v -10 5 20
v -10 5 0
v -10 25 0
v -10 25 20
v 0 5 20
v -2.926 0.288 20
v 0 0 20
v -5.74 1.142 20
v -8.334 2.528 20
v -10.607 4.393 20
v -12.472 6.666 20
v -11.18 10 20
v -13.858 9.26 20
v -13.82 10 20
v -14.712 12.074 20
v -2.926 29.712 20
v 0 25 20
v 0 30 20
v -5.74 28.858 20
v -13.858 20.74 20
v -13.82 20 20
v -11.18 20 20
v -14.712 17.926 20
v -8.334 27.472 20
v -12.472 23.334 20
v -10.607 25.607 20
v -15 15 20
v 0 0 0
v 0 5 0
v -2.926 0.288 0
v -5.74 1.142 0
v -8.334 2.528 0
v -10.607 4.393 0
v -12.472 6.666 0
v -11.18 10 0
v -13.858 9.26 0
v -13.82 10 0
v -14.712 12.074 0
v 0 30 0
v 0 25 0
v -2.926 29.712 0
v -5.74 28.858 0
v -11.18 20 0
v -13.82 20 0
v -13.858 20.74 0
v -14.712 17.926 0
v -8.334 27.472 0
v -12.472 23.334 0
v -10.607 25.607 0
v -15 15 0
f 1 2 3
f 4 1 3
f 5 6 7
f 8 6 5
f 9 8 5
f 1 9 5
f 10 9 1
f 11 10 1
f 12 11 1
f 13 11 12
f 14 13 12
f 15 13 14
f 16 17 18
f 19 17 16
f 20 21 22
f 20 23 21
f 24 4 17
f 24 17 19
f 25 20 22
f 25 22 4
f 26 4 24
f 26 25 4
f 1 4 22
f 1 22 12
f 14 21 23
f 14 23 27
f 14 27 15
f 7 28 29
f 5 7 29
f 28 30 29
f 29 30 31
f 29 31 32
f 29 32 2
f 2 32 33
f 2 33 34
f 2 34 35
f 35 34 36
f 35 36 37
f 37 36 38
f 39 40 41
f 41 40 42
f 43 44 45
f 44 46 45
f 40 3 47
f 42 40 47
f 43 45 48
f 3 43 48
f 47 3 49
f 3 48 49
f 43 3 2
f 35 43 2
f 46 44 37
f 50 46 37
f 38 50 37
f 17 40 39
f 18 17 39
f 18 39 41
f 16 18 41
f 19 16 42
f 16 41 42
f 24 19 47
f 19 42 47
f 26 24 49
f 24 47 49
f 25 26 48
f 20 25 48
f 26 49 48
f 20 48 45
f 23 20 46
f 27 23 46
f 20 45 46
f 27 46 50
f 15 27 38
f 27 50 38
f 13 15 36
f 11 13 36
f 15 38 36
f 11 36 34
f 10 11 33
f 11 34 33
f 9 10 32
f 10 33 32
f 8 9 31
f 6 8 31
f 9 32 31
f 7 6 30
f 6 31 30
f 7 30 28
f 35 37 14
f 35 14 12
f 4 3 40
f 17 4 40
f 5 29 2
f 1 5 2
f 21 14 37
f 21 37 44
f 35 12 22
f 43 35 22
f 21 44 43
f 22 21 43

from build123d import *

# Parameters (mm, degrees)
BOSS_EXTRUDE1_DEPTH = 20
SKETCH2_W           = 2.639320226
SKETCH2_H           = 10
CUT_EXTRUDE1_DEPTH  = 20


with BuildPart() as part:
    # Sketch1 → Boss-Extrude1 (new body)
    with BuildSketch(Plane(origin=(0, 0, 0), x_dir=(0, 1, 0), z_dir=(0, 0, 1))):
        with BuildLine():
            Line((0, 0), (5, 0))
            Line((5, 0), (5, 10))
            Line((5, 10), (25, 10))
            Line((25, 10), (25, 0))
            Line((25, 0), (30, 0))
            ThreePointArc((30, 0), (15, 15), (0, 0))
        make_face()
    extrude(amount=BOSS_EXTRUDE1_DEPTH)

    # Sketch2 → Cut-Extrude1 (cut)
    with BuildSketch(Plane.XY.offset(20)):
        with Locations((-12.5, 15)):
            Rectangle(SKETCH2_W, SKETCH2_H)
    extrude(amount=-CUT_EXTRUDE1_DEPTH, mode=Mode.SUBTRACT)


solid = part.part
